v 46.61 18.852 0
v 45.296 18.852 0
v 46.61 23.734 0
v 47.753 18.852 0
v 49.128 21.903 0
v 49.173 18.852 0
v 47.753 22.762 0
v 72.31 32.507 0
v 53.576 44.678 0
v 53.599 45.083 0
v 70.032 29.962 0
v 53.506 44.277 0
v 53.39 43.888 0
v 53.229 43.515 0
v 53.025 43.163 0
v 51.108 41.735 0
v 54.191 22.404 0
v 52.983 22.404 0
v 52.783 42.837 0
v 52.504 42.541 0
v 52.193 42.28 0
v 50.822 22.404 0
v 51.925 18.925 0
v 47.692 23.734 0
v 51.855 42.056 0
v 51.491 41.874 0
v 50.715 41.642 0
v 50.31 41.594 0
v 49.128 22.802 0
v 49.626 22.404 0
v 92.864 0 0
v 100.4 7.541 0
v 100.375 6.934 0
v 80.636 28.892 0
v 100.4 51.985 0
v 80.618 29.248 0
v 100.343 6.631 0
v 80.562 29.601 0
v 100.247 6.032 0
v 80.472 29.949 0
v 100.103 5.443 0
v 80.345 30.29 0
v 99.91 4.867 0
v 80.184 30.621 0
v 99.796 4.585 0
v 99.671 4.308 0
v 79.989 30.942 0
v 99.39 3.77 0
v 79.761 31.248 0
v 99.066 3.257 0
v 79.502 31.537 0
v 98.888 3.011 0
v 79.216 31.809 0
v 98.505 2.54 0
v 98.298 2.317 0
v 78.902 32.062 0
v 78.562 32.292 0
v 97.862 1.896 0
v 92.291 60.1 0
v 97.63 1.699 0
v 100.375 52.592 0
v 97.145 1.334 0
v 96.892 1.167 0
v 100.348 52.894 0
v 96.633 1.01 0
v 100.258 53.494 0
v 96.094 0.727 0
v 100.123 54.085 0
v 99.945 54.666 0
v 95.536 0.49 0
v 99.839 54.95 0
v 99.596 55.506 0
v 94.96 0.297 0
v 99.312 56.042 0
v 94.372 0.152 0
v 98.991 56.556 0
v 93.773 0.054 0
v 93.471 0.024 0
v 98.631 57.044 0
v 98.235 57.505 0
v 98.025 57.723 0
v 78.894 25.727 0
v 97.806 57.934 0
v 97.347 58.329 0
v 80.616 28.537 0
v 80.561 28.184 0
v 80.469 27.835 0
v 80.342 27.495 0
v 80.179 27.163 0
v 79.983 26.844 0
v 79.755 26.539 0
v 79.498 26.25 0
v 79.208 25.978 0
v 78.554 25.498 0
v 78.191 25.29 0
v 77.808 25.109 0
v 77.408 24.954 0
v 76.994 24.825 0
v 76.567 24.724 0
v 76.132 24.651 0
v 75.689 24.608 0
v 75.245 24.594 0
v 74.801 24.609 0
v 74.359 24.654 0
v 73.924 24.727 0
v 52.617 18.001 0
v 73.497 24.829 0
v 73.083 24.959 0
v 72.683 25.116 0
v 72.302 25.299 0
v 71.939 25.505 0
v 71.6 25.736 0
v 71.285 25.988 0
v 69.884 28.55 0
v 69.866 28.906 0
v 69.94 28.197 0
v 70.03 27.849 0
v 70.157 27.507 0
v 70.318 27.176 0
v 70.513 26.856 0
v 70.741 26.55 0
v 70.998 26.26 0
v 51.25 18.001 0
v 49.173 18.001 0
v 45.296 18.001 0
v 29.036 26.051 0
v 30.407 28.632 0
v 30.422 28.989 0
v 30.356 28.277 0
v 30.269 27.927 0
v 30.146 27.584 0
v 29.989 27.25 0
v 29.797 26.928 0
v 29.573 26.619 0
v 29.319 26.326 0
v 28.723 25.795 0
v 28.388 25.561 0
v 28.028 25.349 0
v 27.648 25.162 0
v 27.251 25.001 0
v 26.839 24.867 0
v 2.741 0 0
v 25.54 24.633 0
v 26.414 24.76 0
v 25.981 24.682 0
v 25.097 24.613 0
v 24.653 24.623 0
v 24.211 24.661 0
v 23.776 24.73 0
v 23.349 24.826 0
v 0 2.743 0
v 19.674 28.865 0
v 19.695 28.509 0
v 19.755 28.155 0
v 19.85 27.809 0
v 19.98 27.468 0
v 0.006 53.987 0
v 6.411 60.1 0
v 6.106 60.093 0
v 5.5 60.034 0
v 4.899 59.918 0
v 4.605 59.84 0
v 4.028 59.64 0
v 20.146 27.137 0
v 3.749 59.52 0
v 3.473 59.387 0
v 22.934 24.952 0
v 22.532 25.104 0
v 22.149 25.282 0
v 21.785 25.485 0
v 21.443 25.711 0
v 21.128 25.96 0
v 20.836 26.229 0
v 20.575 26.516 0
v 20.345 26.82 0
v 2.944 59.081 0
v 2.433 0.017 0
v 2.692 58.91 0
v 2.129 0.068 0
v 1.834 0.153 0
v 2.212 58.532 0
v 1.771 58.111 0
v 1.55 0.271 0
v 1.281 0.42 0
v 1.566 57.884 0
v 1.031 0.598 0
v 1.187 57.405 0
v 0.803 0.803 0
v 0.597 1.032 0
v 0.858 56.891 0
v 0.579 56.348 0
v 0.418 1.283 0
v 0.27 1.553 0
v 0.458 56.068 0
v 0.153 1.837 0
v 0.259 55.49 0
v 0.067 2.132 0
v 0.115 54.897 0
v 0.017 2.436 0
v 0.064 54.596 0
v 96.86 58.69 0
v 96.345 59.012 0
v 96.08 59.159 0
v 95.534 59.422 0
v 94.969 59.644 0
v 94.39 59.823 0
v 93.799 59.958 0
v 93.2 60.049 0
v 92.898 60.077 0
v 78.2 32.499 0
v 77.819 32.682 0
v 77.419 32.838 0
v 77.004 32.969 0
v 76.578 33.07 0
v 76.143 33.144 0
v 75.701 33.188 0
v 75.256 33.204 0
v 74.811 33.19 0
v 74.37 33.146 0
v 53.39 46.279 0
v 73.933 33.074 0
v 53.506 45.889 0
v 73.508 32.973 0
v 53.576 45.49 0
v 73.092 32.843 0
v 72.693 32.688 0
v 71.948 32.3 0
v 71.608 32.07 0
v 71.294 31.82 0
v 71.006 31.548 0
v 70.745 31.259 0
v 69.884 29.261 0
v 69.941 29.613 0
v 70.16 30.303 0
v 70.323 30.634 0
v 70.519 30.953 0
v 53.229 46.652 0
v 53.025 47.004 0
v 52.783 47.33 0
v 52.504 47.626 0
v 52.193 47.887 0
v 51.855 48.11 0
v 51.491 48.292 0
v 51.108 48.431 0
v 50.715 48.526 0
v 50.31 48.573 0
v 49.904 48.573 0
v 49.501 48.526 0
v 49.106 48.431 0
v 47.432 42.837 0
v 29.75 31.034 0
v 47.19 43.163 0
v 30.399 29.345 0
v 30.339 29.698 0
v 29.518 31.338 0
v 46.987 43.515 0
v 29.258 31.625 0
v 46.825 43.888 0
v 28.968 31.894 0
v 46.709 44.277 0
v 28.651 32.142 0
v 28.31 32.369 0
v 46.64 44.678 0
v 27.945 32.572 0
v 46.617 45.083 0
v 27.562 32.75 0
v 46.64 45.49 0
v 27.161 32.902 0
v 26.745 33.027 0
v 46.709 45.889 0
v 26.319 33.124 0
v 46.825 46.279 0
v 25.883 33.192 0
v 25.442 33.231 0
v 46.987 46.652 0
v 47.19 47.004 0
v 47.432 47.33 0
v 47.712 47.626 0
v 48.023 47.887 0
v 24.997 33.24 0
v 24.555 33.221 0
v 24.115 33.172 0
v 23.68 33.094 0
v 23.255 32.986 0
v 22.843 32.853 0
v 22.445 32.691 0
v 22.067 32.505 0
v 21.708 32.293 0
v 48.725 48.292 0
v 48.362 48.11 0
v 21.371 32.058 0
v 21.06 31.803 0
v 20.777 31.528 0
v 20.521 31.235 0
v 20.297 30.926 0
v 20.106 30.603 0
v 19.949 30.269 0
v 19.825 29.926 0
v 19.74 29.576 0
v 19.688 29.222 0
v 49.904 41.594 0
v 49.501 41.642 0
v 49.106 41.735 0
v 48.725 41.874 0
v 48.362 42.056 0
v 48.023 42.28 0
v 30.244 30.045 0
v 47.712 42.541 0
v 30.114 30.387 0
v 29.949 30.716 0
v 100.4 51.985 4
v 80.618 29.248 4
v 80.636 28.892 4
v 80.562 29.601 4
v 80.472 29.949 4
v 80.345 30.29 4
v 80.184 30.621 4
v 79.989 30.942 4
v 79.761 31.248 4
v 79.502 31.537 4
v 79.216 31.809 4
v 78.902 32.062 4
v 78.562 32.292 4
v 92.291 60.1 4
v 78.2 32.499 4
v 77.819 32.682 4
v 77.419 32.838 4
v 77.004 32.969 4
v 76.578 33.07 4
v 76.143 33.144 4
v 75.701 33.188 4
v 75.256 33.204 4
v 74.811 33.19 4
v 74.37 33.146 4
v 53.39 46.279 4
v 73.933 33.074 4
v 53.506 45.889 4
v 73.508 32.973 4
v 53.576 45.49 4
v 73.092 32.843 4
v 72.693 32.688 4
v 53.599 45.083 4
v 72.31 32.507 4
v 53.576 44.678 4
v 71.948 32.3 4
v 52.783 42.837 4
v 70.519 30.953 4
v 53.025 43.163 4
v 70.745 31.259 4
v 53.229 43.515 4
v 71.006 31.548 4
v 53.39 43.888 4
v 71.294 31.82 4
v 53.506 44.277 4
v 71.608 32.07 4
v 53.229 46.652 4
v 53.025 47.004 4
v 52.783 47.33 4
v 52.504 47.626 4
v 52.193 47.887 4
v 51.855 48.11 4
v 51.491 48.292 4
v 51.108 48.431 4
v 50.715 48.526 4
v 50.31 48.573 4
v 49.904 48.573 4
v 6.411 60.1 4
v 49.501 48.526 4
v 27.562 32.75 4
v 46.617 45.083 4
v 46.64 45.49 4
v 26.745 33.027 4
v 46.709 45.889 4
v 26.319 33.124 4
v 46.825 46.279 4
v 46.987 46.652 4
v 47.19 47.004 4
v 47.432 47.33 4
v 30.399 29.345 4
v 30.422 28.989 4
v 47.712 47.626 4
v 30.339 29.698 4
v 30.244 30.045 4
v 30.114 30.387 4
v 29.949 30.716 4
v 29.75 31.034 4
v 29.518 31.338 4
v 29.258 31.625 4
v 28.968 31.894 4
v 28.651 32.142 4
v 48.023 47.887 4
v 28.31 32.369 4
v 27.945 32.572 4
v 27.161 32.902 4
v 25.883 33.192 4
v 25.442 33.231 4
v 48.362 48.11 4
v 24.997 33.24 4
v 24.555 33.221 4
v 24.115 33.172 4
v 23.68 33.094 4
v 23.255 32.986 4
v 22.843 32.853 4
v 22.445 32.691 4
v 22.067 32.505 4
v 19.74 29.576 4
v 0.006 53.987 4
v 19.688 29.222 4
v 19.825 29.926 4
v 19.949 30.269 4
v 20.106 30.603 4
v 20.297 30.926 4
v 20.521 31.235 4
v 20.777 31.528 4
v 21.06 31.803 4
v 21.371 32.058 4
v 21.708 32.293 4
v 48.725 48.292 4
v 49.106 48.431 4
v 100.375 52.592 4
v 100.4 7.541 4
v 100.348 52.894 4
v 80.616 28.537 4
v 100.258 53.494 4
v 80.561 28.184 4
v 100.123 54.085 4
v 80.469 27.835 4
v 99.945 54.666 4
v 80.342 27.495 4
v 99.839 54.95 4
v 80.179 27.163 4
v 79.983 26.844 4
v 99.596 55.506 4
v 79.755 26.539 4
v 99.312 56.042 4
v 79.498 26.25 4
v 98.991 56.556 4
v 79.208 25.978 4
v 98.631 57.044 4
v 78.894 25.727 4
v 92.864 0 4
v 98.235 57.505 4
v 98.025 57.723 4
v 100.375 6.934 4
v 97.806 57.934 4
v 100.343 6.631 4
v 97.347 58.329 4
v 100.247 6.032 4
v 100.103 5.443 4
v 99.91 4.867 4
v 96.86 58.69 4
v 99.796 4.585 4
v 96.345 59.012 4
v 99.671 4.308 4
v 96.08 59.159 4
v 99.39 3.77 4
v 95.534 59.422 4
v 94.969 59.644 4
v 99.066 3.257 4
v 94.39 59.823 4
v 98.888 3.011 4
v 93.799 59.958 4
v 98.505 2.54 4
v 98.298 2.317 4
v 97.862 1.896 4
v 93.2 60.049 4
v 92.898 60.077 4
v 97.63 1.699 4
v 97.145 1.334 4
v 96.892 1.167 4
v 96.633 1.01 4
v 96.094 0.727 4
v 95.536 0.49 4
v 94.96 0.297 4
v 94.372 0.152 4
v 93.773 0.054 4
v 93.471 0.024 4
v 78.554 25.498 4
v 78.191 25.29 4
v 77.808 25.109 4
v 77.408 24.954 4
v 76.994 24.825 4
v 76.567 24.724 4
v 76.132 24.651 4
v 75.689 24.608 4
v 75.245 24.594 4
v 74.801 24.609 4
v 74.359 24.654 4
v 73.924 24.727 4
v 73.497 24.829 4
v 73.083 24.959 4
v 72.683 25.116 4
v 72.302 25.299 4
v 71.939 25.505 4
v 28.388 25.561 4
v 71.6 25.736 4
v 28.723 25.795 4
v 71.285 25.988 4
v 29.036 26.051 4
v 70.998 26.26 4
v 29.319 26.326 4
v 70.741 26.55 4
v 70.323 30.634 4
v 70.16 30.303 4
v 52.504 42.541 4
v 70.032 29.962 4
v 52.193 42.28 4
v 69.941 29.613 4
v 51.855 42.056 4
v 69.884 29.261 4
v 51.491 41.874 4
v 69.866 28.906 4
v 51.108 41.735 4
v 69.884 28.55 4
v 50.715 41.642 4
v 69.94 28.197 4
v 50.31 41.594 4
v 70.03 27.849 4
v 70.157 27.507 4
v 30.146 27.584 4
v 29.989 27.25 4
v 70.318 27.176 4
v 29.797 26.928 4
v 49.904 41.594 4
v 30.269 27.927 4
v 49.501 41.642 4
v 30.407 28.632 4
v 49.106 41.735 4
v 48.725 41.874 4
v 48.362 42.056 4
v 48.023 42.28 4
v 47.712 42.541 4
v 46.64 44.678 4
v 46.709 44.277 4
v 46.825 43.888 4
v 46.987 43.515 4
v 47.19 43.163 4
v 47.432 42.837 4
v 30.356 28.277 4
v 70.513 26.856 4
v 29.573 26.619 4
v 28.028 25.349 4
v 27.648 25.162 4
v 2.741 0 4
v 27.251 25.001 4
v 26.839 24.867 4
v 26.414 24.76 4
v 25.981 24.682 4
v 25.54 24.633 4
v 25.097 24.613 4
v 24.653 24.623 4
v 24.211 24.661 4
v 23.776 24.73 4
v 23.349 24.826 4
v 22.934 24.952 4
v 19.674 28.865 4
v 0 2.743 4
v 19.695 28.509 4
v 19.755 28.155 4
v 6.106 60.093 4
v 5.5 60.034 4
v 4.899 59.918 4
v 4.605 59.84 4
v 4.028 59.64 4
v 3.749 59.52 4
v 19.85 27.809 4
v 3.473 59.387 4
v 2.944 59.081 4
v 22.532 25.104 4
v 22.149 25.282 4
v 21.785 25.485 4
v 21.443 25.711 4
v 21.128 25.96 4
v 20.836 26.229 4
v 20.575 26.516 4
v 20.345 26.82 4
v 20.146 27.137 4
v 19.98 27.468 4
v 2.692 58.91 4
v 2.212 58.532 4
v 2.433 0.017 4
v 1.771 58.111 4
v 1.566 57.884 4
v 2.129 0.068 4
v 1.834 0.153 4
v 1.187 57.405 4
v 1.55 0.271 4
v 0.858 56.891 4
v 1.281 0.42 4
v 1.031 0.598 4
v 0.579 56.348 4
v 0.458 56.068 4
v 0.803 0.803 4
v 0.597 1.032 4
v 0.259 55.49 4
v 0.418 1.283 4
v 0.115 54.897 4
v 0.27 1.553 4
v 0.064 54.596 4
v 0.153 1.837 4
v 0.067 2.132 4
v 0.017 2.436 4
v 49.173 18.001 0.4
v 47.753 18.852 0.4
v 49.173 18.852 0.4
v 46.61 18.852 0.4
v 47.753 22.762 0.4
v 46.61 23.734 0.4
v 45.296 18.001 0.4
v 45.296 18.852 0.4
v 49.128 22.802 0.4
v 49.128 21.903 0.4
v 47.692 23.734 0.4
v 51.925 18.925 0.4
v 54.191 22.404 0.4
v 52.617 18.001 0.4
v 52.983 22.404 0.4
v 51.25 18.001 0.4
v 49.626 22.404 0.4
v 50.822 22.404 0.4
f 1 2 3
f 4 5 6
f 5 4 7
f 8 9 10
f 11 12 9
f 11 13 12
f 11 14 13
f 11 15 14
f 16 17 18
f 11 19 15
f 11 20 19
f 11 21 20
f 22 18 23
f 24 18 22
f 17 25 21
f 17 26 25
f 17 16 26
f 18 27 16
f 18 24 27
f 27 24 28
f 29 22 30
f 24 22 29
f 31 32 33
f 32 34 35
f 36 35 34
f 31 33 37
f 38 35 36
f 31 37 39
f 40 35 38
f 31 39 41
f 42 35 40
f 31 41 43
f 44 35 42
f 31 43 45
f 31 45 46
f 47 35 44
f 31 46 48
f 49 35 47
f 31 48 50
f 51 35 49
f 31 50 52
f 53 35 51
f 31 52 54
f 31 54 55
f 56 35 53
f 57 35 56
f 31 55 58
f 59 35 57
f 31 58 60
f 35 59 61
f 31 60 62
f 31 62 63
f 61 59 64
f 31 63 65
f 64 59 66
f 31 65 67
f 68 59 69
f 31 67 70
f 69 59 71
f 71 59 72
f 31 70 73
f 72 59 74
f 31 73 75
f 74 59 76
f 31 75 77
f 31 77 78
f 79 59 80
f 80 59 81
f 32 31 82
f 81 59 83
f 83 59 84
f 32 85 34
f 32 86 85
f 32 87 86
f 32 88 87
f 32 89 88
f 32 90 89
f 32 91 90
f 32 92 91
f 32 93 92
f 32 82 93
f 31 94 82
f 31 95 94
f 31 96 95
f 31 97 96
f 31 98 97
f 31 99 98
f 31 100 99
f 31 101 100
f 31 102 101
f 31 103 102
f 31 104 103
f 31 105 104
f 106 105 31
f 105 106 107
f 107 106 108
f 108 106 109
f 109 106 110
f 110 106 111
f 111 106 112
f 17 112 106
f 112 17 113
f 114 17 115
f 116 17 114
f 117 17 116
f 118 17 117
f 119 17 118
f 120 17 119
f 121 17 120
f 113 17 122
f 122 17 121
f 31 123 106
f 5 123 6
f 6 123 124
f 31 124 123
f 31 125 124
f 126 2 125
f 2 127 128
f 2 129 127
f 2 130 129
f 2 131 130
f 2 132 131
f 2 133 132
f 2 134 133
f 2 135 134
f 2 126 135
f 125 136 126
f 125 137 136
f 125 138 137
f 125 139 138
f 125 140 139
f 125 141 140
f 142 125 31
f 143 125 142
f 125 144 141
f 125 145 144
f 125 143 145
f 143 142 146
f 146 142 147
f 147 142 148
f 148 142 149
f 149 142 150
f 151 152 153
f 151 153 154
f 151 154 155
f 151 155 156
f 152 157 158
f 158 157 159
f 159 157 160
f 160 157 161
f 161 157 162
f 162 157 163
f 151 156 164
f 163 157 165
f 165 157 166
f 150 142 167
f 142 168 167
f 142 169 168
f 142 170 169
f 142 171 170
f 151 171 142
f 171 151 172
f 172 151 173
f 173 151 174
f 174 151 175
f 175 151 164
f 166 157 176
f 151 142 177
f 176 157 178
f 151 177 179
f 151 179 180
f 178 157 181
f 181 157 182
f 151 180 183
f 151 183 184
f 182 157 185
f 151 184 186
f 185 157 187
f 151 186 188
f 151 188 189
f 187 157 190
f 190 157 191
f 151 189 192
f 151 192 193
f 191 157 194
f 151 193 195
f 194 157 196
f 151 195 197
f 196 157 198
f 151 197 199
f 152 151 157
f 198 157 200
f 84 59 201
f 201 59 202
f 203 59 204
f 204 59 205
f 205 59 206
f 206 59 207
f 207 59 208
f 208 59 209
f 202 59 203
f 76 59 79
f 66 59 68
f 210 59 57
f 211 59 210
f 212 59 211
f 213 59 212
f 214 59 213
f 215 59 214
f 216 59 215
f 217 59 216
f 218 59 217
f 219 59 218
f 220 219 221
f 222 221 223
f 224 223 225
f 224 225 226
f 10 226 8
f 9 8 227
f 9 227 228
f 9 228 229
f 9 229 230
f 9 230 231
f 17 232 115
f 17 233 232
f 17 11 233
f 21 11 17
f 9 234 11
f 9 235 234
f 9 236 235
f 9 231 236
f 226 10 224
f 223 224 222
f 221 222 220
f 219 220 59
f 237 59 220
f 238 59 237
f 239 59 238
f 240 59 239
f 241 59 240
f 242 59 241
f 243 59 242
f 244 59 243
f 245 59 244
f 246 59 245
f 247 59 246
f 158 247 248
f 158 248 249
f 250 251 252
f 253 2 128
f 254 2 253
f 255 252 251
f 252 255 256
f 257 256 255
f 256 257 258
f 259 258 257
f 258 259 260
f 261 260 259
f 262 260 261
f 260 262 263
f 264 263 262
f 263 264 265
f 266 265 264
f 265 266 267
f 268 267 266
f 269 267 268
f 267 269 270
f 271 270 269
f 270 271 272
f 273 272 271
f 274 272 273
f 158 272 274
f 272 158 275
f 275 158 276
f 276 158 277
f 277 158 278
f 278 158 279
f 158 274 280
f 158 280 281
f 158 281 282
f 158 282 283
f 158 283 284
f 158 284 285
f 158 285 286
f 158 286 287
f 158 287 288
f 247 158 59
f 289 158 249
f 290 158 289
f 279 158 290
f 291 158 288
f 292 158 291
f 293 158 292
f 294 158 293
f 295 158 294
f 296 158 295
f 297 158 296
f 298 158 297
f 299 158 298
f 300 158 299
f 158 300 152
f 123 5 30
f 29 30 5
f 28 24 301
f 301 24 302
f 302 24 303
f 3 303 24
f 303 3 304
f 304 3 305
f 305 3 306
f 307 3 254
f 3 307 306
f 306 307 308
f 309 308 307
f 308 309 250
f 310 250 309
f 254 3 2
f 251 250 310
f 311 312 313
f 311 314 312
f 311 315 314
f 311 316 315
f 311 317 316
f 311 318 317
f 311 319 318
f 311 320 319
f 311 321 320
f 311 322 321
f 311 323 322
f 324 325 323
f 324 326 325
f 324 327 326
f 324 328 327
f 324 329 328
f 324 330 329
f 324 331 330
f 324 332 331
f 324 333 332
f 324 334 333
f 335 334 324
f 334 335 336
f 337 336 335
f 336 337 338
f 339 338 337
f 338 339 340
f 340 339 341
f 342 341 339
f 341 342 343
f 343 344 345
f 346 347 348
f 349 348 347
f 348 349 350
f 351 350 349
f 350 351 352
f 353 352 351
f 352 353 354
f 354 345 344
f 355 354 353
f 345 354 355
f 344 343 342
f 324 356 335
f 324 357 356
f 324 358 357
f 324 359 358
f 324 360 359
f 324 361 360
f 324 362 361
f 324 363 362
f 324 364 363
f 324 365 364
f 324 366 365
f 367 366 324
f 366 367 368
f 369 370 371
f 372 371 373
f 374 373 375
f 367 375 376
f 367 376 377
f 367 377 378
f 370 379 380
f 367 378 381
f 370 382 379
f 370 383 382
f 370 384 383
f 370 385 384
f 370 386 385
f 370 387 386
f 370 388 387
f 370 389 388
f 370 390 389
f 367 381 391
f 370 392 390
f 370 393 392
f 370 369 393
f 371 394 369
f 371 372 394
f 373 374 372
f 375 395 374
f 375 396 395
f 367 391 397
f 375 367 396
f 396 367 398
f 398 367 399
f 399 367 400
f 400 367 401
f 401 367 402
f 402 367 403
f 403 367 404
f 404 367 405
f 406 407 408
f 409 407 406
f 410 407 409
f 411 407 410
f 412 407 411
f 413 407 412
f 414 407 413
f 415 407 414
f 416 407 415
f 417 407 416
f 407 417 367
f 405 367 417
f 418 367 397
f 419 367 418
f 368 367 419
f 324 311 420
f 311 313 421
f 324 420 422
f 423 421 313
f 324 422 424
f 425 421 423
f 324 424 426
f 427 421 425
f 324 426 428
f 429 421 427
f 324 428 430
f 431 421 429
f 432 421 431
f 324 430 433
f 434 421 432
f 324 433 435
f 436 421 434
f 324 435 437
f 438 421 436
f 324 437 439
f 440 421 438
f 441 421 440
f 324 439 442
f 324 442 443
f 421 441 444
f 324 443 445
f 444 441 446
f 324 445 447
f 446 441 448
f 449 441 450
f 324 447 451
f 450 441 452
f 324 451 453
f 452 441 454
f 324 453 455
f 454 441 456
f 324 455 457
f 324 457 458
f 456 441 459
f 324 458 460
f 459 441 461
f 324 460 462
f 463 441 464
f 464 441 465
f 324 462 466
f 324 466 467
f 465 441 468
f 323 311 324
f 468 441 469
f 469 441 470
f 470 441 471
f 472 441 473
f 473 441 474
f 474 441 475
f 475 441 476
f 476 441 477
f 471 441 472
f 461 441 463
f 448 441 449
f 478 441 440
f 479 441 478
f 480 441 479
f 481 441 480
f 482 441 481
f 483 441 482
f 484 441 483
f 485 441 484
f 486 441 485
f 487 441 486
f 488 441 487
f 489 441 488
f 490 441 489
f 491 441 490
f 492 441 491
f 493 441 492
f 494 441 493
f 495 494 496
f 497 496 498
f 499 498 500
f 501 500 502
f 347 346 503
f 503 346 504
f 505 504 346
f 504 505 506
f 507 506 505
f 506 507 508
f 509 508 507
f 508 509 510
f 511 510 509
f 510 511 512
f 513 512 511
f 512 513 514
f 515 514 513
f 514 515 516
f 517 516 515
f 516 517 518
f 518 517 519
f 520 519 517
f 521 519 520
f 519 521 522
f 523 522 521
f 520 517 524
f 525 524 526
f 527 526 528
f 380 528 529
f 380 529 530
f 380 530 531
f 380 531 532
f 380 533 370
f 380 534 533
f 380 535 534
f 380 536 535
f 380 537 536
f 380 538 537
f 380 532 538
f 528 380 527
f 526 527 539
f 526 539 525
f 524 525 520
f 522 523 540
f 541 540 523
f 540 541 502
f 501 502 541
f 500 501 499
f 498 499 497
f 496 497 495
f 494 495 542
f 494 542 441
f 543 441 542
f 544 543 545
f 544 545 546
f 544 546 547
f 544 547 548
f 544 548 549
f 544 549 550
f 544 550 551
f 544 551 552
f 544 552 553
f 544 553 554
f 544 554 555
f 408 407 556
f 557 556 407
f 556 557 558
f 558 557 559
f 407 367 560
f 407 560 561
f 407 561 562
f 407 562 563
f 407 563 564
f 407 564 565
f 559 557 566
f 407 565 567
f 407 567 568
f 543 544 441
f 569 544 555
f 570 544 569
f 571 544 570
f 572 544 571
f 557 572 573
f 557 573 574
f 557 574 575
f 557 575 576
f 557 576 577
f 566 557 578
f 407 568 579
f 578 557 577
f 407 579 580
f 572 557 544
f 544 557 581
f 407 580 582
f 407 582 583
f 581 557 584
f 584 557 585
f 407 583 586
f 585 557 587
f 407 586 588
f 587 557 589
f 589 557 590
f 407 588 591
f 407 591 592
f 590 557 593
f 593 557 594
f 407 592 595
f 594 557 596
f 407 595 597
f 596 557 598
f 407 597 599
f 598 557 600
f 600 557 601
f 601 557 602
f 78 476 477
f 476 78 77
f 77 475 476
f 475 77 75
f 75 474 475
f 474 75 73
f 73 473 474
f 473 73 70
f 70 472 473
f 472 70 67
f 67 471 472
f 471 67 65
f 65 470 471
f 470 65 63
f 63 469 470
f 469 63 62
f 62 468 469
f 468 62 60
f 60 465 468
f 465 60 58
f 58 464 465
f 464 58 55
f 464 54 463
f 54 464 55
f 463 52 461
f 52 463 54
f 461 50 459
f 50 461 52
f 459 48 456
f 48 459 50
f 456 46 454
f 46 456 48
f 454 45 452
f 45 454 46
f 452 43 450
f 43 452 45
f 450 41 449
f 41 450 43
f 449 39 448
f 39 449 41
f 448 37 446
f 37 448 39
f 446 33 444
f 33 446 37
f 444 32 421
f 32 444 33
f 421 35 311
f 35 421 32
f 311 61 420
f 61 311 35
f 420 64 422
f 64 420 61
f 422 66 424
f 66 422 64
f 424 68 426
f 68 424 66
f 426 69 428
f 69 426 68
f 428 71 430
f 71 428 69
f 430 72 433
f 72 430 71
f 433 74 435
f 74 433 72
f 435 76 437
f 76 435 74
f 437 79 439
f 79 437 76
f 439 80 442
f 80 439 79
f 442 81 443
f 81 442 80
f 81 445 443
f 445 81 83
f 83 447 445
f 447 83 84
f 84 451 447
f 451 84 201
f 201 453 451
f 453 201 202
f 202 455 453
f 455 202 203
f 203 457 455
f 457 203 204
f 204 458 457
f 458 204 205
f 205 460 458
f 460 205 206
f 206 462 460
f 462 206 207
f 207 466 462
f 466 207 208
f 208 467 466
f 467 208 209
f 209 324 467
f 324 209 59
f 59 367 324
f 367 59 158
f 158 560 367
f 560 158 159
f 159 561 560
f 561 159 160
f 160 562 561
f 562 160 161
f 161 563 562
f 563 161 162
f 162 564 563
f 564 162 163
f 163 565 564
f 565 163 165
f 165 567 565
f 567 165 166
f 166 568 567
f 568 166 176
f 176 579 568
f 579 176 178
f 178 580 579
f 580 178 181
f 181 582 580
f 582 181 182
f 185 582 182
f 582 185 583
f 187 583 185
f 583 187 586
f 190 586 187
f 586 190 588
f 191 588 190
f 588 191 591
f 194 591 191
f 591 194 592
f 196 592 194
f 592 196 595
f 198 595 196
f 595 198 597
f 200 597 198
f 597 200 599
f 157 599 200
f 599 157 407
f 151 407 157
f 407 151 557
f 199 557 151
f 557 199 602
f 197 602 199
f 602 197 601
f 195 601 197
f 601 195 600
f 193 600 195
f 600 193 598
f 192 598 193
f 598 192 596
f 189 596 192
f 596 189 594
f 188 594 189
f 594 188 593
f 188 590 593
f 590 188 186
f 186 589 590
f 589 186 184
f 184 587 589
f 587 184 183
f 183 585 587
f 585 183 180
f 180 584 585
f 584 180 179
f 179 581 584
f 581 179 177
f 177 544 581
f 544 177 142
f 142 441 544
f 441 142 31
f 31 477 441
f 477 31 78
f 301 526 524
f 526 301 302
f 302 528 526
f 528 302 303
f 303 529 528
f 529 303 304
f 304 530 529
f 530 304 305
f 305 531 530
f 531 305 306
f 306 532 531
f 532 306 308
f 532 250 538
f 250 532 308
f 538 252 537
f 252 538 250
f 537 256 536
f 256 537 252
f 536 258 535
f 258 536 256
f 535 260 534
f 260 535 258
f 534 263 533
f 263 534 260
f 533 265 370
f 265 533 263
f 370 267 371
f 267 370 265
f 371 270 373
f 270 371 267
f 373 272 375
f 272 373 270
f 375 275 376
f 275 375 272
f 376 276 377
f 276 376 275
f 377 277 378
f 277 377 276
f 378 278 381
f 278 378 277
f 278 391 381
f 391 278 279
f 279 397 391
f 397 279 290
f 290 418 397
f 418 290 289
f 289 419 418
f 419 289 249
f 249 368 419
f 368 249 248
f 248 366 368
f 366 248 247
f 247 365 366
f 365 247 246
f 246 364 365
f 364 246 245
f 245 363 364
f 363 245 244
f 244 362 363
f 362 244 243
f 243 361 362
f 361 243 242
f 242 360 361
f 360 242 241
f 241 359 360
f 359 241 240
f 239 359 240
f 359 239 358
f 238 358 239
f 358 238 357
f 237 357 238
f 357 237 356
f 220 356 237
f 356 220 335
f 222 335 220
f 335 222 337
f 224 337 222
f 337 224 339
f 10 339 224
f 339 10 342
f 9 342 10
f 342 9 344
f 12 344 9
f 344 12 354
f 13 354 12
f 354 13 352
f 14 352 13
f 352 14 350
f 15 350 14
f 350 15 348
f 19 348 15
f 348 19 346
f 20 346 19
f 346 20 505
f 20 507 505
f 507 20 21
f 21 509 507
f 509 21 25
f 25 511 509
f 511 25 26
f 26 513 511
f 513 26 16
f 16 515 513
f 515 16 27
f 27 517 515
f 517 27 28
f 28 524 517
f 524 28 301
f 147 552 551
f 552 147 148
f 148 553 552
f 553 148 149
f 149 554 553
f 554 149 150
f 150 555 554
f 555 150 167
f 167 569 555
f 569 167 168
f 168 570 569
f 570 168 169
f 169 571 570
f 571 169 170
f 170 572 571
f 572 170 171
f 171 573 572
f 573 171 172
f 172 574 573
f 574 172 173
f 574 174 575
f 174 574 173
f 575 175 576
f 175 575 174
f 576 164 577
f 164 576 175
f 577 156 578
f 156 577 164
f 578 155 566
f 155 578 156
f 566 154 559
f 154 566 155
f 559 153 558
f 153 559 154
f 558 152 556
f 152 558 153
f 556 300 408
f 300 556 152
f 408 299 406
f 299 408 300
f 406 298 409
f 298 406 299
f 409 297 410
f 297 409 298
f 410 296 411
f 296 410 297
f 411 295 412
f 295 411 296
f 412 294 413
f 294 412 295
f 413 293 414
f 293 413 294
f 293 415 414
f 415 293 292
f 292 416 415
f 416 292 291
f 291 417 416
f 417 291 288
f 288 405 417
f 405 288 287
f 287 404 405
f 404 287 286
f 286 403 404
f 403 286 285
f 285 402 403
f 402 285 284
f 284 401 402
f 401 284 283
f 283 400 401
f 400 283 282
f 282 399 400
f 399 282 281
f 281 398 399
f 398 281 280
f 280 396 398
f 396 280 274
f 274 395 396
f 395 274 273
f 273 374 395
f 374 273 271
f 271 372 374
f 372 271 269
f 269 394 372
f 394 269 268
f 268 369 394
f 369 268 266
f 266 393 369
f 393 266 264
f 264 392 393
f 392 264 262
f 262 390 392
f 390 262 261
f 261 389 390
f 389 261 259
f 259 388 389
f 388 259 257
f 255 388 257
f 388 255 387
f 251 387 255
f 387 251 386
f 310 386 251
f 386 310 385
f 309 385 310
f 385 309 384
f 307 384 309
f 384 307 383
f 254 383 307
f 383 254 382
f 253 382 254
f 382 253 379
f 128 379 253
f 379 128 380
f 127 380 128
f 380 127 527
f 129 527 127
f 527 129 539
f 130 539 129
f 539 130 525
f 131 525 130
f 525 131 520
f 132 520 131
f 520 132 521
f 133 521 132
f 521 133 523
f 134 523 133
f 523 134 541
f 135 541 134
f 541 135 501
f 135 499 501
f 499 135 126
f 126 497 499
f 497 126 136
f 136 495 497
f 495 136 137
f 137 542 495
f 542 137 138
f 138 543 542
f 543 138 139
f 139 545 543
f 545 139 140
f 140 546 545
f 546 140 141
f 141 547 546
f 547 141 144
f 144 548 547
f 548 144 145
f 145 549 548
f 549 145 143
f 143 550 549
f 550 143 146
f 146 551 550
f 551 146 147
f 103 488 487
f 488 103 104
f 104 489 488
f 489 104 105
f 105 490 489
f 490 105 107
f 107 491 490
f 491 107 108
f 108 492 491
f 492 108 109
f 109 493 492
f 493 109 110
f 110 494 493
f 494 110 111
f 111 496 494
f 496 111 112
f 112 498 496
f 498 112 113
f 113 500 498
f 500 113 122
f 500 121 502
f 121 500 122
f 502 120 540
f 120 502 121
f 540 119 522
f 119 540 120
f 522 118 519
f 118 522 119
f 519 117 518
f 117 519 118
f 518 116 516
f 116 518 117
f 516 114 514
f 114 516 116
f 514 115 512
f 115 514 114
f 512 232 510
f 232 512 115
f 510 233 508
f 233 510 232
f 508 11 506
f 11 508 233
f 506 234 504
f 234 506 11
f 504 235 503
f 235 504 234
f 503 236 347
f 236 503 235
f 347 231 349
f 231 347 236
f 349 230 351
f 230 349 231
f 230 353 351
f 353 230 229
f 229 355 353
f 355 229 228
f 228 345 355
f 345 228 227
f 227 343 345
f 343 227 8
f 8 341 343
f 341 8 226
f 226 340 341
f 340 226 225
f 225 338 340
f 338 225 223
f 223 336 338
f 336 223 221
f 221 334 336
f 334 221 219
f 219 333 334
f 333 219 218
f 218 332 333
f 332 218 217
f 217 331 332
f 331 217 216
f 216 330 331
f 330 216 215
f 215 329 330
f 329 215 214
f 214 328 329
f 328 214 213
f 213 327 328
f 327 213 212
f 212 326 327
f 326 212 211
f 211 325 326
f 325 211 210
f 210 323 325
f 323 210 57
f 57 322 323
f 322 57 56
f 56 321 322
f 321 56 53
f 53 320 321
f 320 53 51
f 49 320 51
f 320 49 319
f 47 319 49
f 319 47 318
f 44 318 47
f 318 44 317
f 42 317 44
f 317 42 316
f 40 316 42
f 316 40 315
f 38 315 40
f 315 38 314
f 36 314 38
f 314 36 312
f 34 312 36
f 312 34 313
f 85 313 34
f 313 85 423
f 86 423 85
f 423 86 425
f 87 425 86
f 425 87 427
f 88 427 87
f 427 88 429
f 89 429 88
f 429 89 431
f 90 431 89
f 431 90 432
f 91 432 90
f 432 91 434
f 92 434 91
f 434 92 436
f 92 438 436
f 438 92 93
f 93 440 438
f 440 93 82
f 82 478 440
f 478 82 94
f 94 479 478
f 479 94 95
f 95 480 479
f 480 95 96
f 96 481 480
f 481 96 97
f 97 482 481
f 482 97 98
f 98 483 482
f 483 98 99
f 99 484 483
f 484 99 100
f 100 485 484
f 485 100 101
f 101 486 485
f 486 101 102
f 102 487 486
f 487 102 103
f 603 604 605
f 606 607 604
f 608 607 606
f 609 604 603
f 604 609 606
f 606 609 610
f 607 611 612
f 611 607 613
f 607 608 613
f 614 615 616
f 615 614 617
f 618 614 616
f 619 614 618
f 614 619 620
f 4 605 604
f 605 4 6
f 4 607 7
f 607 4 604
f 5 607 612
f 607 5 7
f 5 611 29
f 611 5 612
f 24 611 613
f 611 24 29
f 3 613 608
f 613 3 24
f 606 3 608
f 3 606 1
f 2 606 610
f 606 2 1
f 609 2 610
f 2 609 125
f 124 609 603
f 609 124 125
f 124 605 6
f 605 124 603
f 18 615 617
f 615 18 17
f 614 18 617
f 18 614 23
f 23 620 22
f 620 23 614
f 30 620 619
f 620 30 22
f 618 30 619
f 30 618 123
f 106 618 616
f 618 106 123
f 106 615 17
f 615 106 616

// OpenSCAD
// plate — generated by protobot from a sketch (photo_plate.jpg)
// 2026-11-04
//
// Print: Prusa Core One, 0.4 mm nozzle, PLA, 0.2 mm layers, flat on the bed.
// The outline is stored in a 0..1 unit box and scaled by LENGTH/WIDTH, so
// the three measurements below are all you need to change. Re-export with:
//   openscad --backend=manifold --export-format binstl -o plate.stl plate.scad
//
// Dimension tags: [M] = given by the user, [S] = traced from the sketch.

/* [Measurements] */
LENGTH    = 100.4;   // [M] X extent, mm
WIDTH     = 60.1;   // [M] Y extent, mm
THICKNESS = 4;   // [M] extrusion height, mm

/* [Edge finish] */
// Perimeter edges (outline AND holes), top and bottom faces.
// "fillet" = rounded, "chamfer" = 45°, "none" = sharp. Built in LAYER steps,
// i.e. exactly as the printer will lay it down.
EDGE_TOP_KIND    = "none";
EDGE_TOP         = 0;     // mm
EDGE_BOTTOM_KIND = "none";
EDGE_BOTTOM      = 0;     // mm
LAYER            = 0.2;   // mm, print layer height

/* [Version stamp] */
VERSION        = 1;       // bump every revision
VERSION_POS    = [0.4950, 0.3461];  // [S] unit-box spot deepest inside the shape
VERSION_SIZE   = 6;      // mm text height
VERSION_DEPTH  = 0.4;    // mm, 2 layers at 0.2

/* [Screws and nuts] */
// One entry per screw hole: [x, y] in the unit box (scaled by LENGTH/WIDTH),
// then its cuts: ["circle", Ø] = screw-head recess, ["hex", across flats] =
// nut pocket, each [.., depth mm, "top"|"bottom"]. The clearance hole itself
// is part of the outline below.
FASTENERS = [];

/* [Hidden] */
// [S] traced outline (+ holes), unit box, y up.
OUTLINE_PTS = [
    [0.92528,0.99962], [0.92829,0.99915], [0.93426,0.99765], [0.94015,0.99540], [0.94592,0.99242], [0.95154,0.98873],
    [0.95698,0.98435], [0.95962,0.98191], [0.96474,0.97654], [0.96960,0.97054], [0.97417,0.96396], [0.97635,0.96046],
    [0.97844,0.95682], [0.98238,0.94917], [0.98597,0.94104], [0.98918,0.93249], [0.99200,0.92357], [0.99442,0.91431],
    [0.99547,0.90958], [0.99725,0.89993], [0.99859,0.89009], [0.99949,0.88011], [0.99977,0.87508], [1.00000,0.86499],
    [1.00000,0.12548], [0.99976,0.11538], [0.99945,0.11035], [0.99848,0.10038], [0.99704,0.09057], [0.99512,0.08098],
    [0.99399,0.07630], [0.99275,0.07169], [0.98995,0.06274], [0.98671,0.05420], [0.98495,0.05010], [0.98113,0.04227],
    [0.97908,0.03856], [0.97472,0.03156], [0.97242,0.02828], [0.96758,0.02221], [0.96506,0.01943], [0.96248,0.01681],
    [0.95712,0.01211], [0.95156,0.00815], [0.94583,0.00495], [0.93996,0.00254], [0.93400,0.00091], [0.93099,0.00041],
    [0.92495,0.00000], [0.02730,0.00000], [0.02424,0.00029], [0.02122,0.00114], [0.01828,0.00256], [0.01545,0.00452],
    [0.01277,0.00700], [0.01028,0.00996], [0.00800,0.01337], [0.00596,0.01718], [0.00418,0.02136], [0.00270,0.02584],
    [0.00153,0.03057], [0.00068,0.03548], [0.00017,0.04053], [0.00000,0.04564], [0.00007,0.89830], [0.00065,0.90842],
    [0.00115,0.91343], [0.00259,0.92330], [0.00457,0.93291], [0.00577,0.93758], [0.00856,0.94661], [0.01184,0.95516],
    [0.01560,0.96315], [0.01764,0.96691], [0.02204,0.97392], [0.02682,0.98020], [0.02934,0.98305], [0.03460,0.98813],
    [0.03734,0.99035], [0.04013,0.99235], [0.04587,0.99567], [0.04881,0.99699], [0.05478,0.99891], [0.06083,0.99988],
    [0.06387,1.00000], [0.91925,1.00000], [0.73640,0.55032], [0.73215,0.54864], [0.72802,0.54649], [0.72404,0.54390],
    [0.72023,0.54088], [0.71662,0.53745], [0.71323,0.53363], [0.71010,0.52945], [0.70723,0.52494], [0.70465,0.52012],
    [0.70238,0.51504], [0.70043,0.50973], [0.69881,0.50422], [0.69754,0.49855], [0.69663,0.49275], [0.69607,0.48688],
    [0.69589,0.48096], [0.69607,0.47505], [0.69661,0.46917], [0.69752,0.46338], [0.69878,0.45770], [0.70038,0.45218],
    [0.70233,0.44686], [0.70459,0.44177], [0.70716,0.43694], [0.71002,0.43242], [0.71316,0.42823], [0.71653,0.42439],
    [0.72014,0.42095], [0.72394,0.41791], [0.72793,0.41530], [0.73205,0.41314], [0.73630,0.41144], [0.74064,0.41022],
    [0.74503,0.40948], [0.74946,0.40922], [0.75389,0.40946], [0.75829,0.41018], [0.76263,0.41139], [0.76688,0.41307],
    [0.77101,0.41521], [0.77499,0.41780], [0.77880,0.42082], [0.78241,0.42426], [0.78580,0.42808], [0.78894,0.43226],
    [0.79181,0.43677], [0.79438,0.44158], [0.79666,0.44666], [0.79861,0.45198], [0.80022,0.45749], [0.80149,0.46316],
    [0.80241,0.46895], [0.80296,0.47483], [0.80315,0.48074], [0.80297,0.48666], [0.80242,0.49253], [0.80152,0.49833],
    [0.80026,0.50400], [0.79865,0.50952], [0.79671,0.51485], [0.79444,0.51994], [0.79187,0.52476], [0.78901,0.52928],
    [0.78588,0.53348], [0.78250,0.53731], [0.77889,0.54076], [0.77509,0.54380], [0.77111,0.54640], [0.76698,0.54857],
    [0.76273,0.55026], [0.75840,0.55149], [0.75400,0.55223], [0.74957,0.55248], [0.74514,0.55225], [0.74074,0.55152],
    [0.24019,0.55195], [0.23587,0.55065], [0.23164,0.54887], [0.22753,0.54664], [0.22357,0.54396], [0.21979,0.54085],
    [0.21622,0.53733], [0.21287,0.53343], [0.20977,0.52918], [0.20694,0.52460], [0.20440,0.51972], [0.20217,0.51458],
    [0.20027,0.50921], [0.19870,0.50366], [0.19747,0.49795], [0.19661,0.49212], [0.19610,0.48623], [0.19596,0.48029],
    [0.19618,0.47437], [0.19677,0.46849], [0.19771,0.46271], [0.19902,0.45704], [0.20066,0.45155], [0.20264,0.44626],
    [0.20494,0.44120], [0.20755,0.43642], [0.21044,0.43195], [0.21359,0.42782], [0.21699,0.42405], [0.22062,0.42067],
    [0.22444,0.41771], [0.22843,0.41518], [0.23257,0.41310], [0.23682,0.41149], [0.24116,0.41035], [0.24555,0.40970],
    [0.24997,0.40954], [0.25439,0.40987], [0.25878,0.41069], [0.26310,0.41199], [0.26733,0.41377], [0.27143,0.41600],
    [0.27539,0.41868], [0.27917,0.42179], [0.28275,0.42531], [0.28610,0.42921], [0.28920,0.43346], [0.29203,0.43804],
    [0.29456,0.44292], [0.29679,0.44806], [0.29870,0.45343], [0.30027,0.45898], [0.30149,0.46469], [0.30236,0.47052],
    [0.30287,0.47642], [0.30301,0.48235], [0.30279,0.48827], [0.30220,0.49415], [0.30125,0.49993], [0.29995,0.50560],
    [0.29830,0.51109], [0.29632,0.51638], [0.29402,0.52144], [0.29142,0.52622], [0.28853,0.53069], [0.28537,0.53482],
    [0.28197,0.53859], [0.27835,0.54197], [0.27453,0.54493], [0.27053,0.54746], [0.26640,0.54954], [0.26215,0.55115],
    [0.25781,0.55229], [0.25341,0.55294], [0.24899,0.55310], [0.24457,0.55277], [0.53364,0.75690], [0.53293,0.76356],
    [0.53177,0.77004], [0.53017,0.77625], [0.52815,0.78210], [0.52573,0.78753], [0.52296,0.79245], [0.51986,0.79679],
    [0.51648,0.80051], [0.51287,0.80354], [0.50906,0.80586], [0.50513,0.80742], [0.50111,0.80820], [0.49707,0.80820],
    [0.49305,0.80742], [0.48911,0.80586], [0.48531,0.80354], [0.48170,0.80051], [0.47832,0.79679], [0.47522,0.79245],
    [0.47244,0.78753], [0.47003,0.78210], [0.46801,0.77625], [0.46640,0.77004], [0.46524,0.76356], [0.46454,0.75690],
    [0.46431,0.75015], [0.46454,0.74340], [0.46524,0.73674], [0.46640,0.73026], [0.46801,0.72405], [0.47003,0.71819],
    [0.47244,0.71277], [0.47522,0.70785], [0.47832,0.70350], [0.48170,0.69978], [0.48531,0.69675], [0.48911,0.69444],
    [0.49305,0.69288], [0.49707,0.69209], [0.50111,0.69209], [0.50513,0.69288], [0.50906,0.69444], [0.51287,0.69675],
    [0.51648,0.69978], [0.51986,0.70350], [0.52296,0.70785], [0.52573,0.71277], [0.52815,0.71819], [0.53017,0.72405],
    [0.53177,0.73026], [0.53293,0.73674], [0.53364,0.74340], [0.53387,0.75015]
];
OUTLINE_PATHS = [
    [for (i = [0:85]) i],
    [for (i = [86:161]) i],
    [for (i = [162:237]) i],
    [for (i = [238:291]) i]
];

module outline_2d() {
    scale([LENGTH, WIDTH]) polygon(points = OUTLINE_PTS, paths = OUTLINE_PATHS);
}

// Debossed into the bottom face, mirrored so it reads from underneath.
module version_stamp() {
    if (!is_undef(VERSION_POS) && VERSION_SIZE > 0)
        translate([VERSION_POS[0] * LENGTH, VERSION_POS[1] * WIDTH, -0.01])
            linear_extrude(VERSION_DEPTH + 0.01)
                mirror([1, 0])
                    text(str("v", VERSION), size = VERSION_SIZE,
                         font = "Liberation Sans:style=Bold",
                         halign = "center", valign = "center");
}

// Screw-head recesses and nut pockets, cut into the top or bottom face.
module fastener_cuts() {
    for (f = FASTENERS) for (c = f[1])
        translate([f[0][0] * LENGTH, f[0][1] * WIDTH,
                   c[3] == "top" ? THICKNESS - c[2] : -0.01])
            linear_extrude(c[2] + 0.01 + (c[3] == "top" ? 0.01 : 0))
                if (c[0] == "hex") circle(d = c[1] / cos(30), $fn = 6);
                else circle(d = c[1]);
}

// How far the outline is pulled in at depth d (0..r) into a finished edge.
function edge_inset(kind, r, d) =
    kind == "chamfer" ? max(0, r - d) :
    kind == "fillet"  ? r - sqrt(max(0, r * r - (r - min(d, r)) * (r - min(d, r)))) : 0;

module body() {
    nb = EDGE_BOTTOM_KIND == "none" ? 0 : ceil(EDGE_BOTTOM / LAYER - 1e-6);
    nt = EDGE_TOP_KIND    == "none" ? 0 : ceil(EDGE_TOP / LAYER - 1e-6);
    zb = nb * LAYER;
    zt = nt * LAYER;
    union() {
        // straight-walled core, overlapping the finished layers (no shared faces)
        translate([0, 0, zb - (nb > 0 ? 0.01 : 0)])
            linear_extrude(THICKNESS - zb - zt + (nb > 0 ? 0.01 : 0) + (nt > 0 ? 0.01 : 0))
                outline_2d();
        if (nb > 0) for (i = [0 : nb - 1])
            translate([0, 0, i * LAYER])
                linear_extrude(LAYER + 0.01)
                    offset(delta = -edge_inset(EDGE_BOTTOM_KIND, EDGE_BOTTOM, (i + 0.5) * LAYER))
                        outline_2d();
        if (nt > 0) for (i = [0 : nt - 1])
            translate([0, 0, THICKNESS - (i + 1) * LAYER - (i < nt - 1 ? 0.01 : 0)])
                linear_extrude(LAYER + (i < nt - 1 ? 0.01 : 0))
                    offset(delta = -edge_inset(EDGE_TOP_KIND, EDGE_TOP, (i + 0.5) * LAYER))
                        outline_2d();
    }
}

module part() {
    $fa = 2; $fs = 0.4;
    difference() {
        body();
        version_stamp();
        fastener_cuts();
    }
}

part();
